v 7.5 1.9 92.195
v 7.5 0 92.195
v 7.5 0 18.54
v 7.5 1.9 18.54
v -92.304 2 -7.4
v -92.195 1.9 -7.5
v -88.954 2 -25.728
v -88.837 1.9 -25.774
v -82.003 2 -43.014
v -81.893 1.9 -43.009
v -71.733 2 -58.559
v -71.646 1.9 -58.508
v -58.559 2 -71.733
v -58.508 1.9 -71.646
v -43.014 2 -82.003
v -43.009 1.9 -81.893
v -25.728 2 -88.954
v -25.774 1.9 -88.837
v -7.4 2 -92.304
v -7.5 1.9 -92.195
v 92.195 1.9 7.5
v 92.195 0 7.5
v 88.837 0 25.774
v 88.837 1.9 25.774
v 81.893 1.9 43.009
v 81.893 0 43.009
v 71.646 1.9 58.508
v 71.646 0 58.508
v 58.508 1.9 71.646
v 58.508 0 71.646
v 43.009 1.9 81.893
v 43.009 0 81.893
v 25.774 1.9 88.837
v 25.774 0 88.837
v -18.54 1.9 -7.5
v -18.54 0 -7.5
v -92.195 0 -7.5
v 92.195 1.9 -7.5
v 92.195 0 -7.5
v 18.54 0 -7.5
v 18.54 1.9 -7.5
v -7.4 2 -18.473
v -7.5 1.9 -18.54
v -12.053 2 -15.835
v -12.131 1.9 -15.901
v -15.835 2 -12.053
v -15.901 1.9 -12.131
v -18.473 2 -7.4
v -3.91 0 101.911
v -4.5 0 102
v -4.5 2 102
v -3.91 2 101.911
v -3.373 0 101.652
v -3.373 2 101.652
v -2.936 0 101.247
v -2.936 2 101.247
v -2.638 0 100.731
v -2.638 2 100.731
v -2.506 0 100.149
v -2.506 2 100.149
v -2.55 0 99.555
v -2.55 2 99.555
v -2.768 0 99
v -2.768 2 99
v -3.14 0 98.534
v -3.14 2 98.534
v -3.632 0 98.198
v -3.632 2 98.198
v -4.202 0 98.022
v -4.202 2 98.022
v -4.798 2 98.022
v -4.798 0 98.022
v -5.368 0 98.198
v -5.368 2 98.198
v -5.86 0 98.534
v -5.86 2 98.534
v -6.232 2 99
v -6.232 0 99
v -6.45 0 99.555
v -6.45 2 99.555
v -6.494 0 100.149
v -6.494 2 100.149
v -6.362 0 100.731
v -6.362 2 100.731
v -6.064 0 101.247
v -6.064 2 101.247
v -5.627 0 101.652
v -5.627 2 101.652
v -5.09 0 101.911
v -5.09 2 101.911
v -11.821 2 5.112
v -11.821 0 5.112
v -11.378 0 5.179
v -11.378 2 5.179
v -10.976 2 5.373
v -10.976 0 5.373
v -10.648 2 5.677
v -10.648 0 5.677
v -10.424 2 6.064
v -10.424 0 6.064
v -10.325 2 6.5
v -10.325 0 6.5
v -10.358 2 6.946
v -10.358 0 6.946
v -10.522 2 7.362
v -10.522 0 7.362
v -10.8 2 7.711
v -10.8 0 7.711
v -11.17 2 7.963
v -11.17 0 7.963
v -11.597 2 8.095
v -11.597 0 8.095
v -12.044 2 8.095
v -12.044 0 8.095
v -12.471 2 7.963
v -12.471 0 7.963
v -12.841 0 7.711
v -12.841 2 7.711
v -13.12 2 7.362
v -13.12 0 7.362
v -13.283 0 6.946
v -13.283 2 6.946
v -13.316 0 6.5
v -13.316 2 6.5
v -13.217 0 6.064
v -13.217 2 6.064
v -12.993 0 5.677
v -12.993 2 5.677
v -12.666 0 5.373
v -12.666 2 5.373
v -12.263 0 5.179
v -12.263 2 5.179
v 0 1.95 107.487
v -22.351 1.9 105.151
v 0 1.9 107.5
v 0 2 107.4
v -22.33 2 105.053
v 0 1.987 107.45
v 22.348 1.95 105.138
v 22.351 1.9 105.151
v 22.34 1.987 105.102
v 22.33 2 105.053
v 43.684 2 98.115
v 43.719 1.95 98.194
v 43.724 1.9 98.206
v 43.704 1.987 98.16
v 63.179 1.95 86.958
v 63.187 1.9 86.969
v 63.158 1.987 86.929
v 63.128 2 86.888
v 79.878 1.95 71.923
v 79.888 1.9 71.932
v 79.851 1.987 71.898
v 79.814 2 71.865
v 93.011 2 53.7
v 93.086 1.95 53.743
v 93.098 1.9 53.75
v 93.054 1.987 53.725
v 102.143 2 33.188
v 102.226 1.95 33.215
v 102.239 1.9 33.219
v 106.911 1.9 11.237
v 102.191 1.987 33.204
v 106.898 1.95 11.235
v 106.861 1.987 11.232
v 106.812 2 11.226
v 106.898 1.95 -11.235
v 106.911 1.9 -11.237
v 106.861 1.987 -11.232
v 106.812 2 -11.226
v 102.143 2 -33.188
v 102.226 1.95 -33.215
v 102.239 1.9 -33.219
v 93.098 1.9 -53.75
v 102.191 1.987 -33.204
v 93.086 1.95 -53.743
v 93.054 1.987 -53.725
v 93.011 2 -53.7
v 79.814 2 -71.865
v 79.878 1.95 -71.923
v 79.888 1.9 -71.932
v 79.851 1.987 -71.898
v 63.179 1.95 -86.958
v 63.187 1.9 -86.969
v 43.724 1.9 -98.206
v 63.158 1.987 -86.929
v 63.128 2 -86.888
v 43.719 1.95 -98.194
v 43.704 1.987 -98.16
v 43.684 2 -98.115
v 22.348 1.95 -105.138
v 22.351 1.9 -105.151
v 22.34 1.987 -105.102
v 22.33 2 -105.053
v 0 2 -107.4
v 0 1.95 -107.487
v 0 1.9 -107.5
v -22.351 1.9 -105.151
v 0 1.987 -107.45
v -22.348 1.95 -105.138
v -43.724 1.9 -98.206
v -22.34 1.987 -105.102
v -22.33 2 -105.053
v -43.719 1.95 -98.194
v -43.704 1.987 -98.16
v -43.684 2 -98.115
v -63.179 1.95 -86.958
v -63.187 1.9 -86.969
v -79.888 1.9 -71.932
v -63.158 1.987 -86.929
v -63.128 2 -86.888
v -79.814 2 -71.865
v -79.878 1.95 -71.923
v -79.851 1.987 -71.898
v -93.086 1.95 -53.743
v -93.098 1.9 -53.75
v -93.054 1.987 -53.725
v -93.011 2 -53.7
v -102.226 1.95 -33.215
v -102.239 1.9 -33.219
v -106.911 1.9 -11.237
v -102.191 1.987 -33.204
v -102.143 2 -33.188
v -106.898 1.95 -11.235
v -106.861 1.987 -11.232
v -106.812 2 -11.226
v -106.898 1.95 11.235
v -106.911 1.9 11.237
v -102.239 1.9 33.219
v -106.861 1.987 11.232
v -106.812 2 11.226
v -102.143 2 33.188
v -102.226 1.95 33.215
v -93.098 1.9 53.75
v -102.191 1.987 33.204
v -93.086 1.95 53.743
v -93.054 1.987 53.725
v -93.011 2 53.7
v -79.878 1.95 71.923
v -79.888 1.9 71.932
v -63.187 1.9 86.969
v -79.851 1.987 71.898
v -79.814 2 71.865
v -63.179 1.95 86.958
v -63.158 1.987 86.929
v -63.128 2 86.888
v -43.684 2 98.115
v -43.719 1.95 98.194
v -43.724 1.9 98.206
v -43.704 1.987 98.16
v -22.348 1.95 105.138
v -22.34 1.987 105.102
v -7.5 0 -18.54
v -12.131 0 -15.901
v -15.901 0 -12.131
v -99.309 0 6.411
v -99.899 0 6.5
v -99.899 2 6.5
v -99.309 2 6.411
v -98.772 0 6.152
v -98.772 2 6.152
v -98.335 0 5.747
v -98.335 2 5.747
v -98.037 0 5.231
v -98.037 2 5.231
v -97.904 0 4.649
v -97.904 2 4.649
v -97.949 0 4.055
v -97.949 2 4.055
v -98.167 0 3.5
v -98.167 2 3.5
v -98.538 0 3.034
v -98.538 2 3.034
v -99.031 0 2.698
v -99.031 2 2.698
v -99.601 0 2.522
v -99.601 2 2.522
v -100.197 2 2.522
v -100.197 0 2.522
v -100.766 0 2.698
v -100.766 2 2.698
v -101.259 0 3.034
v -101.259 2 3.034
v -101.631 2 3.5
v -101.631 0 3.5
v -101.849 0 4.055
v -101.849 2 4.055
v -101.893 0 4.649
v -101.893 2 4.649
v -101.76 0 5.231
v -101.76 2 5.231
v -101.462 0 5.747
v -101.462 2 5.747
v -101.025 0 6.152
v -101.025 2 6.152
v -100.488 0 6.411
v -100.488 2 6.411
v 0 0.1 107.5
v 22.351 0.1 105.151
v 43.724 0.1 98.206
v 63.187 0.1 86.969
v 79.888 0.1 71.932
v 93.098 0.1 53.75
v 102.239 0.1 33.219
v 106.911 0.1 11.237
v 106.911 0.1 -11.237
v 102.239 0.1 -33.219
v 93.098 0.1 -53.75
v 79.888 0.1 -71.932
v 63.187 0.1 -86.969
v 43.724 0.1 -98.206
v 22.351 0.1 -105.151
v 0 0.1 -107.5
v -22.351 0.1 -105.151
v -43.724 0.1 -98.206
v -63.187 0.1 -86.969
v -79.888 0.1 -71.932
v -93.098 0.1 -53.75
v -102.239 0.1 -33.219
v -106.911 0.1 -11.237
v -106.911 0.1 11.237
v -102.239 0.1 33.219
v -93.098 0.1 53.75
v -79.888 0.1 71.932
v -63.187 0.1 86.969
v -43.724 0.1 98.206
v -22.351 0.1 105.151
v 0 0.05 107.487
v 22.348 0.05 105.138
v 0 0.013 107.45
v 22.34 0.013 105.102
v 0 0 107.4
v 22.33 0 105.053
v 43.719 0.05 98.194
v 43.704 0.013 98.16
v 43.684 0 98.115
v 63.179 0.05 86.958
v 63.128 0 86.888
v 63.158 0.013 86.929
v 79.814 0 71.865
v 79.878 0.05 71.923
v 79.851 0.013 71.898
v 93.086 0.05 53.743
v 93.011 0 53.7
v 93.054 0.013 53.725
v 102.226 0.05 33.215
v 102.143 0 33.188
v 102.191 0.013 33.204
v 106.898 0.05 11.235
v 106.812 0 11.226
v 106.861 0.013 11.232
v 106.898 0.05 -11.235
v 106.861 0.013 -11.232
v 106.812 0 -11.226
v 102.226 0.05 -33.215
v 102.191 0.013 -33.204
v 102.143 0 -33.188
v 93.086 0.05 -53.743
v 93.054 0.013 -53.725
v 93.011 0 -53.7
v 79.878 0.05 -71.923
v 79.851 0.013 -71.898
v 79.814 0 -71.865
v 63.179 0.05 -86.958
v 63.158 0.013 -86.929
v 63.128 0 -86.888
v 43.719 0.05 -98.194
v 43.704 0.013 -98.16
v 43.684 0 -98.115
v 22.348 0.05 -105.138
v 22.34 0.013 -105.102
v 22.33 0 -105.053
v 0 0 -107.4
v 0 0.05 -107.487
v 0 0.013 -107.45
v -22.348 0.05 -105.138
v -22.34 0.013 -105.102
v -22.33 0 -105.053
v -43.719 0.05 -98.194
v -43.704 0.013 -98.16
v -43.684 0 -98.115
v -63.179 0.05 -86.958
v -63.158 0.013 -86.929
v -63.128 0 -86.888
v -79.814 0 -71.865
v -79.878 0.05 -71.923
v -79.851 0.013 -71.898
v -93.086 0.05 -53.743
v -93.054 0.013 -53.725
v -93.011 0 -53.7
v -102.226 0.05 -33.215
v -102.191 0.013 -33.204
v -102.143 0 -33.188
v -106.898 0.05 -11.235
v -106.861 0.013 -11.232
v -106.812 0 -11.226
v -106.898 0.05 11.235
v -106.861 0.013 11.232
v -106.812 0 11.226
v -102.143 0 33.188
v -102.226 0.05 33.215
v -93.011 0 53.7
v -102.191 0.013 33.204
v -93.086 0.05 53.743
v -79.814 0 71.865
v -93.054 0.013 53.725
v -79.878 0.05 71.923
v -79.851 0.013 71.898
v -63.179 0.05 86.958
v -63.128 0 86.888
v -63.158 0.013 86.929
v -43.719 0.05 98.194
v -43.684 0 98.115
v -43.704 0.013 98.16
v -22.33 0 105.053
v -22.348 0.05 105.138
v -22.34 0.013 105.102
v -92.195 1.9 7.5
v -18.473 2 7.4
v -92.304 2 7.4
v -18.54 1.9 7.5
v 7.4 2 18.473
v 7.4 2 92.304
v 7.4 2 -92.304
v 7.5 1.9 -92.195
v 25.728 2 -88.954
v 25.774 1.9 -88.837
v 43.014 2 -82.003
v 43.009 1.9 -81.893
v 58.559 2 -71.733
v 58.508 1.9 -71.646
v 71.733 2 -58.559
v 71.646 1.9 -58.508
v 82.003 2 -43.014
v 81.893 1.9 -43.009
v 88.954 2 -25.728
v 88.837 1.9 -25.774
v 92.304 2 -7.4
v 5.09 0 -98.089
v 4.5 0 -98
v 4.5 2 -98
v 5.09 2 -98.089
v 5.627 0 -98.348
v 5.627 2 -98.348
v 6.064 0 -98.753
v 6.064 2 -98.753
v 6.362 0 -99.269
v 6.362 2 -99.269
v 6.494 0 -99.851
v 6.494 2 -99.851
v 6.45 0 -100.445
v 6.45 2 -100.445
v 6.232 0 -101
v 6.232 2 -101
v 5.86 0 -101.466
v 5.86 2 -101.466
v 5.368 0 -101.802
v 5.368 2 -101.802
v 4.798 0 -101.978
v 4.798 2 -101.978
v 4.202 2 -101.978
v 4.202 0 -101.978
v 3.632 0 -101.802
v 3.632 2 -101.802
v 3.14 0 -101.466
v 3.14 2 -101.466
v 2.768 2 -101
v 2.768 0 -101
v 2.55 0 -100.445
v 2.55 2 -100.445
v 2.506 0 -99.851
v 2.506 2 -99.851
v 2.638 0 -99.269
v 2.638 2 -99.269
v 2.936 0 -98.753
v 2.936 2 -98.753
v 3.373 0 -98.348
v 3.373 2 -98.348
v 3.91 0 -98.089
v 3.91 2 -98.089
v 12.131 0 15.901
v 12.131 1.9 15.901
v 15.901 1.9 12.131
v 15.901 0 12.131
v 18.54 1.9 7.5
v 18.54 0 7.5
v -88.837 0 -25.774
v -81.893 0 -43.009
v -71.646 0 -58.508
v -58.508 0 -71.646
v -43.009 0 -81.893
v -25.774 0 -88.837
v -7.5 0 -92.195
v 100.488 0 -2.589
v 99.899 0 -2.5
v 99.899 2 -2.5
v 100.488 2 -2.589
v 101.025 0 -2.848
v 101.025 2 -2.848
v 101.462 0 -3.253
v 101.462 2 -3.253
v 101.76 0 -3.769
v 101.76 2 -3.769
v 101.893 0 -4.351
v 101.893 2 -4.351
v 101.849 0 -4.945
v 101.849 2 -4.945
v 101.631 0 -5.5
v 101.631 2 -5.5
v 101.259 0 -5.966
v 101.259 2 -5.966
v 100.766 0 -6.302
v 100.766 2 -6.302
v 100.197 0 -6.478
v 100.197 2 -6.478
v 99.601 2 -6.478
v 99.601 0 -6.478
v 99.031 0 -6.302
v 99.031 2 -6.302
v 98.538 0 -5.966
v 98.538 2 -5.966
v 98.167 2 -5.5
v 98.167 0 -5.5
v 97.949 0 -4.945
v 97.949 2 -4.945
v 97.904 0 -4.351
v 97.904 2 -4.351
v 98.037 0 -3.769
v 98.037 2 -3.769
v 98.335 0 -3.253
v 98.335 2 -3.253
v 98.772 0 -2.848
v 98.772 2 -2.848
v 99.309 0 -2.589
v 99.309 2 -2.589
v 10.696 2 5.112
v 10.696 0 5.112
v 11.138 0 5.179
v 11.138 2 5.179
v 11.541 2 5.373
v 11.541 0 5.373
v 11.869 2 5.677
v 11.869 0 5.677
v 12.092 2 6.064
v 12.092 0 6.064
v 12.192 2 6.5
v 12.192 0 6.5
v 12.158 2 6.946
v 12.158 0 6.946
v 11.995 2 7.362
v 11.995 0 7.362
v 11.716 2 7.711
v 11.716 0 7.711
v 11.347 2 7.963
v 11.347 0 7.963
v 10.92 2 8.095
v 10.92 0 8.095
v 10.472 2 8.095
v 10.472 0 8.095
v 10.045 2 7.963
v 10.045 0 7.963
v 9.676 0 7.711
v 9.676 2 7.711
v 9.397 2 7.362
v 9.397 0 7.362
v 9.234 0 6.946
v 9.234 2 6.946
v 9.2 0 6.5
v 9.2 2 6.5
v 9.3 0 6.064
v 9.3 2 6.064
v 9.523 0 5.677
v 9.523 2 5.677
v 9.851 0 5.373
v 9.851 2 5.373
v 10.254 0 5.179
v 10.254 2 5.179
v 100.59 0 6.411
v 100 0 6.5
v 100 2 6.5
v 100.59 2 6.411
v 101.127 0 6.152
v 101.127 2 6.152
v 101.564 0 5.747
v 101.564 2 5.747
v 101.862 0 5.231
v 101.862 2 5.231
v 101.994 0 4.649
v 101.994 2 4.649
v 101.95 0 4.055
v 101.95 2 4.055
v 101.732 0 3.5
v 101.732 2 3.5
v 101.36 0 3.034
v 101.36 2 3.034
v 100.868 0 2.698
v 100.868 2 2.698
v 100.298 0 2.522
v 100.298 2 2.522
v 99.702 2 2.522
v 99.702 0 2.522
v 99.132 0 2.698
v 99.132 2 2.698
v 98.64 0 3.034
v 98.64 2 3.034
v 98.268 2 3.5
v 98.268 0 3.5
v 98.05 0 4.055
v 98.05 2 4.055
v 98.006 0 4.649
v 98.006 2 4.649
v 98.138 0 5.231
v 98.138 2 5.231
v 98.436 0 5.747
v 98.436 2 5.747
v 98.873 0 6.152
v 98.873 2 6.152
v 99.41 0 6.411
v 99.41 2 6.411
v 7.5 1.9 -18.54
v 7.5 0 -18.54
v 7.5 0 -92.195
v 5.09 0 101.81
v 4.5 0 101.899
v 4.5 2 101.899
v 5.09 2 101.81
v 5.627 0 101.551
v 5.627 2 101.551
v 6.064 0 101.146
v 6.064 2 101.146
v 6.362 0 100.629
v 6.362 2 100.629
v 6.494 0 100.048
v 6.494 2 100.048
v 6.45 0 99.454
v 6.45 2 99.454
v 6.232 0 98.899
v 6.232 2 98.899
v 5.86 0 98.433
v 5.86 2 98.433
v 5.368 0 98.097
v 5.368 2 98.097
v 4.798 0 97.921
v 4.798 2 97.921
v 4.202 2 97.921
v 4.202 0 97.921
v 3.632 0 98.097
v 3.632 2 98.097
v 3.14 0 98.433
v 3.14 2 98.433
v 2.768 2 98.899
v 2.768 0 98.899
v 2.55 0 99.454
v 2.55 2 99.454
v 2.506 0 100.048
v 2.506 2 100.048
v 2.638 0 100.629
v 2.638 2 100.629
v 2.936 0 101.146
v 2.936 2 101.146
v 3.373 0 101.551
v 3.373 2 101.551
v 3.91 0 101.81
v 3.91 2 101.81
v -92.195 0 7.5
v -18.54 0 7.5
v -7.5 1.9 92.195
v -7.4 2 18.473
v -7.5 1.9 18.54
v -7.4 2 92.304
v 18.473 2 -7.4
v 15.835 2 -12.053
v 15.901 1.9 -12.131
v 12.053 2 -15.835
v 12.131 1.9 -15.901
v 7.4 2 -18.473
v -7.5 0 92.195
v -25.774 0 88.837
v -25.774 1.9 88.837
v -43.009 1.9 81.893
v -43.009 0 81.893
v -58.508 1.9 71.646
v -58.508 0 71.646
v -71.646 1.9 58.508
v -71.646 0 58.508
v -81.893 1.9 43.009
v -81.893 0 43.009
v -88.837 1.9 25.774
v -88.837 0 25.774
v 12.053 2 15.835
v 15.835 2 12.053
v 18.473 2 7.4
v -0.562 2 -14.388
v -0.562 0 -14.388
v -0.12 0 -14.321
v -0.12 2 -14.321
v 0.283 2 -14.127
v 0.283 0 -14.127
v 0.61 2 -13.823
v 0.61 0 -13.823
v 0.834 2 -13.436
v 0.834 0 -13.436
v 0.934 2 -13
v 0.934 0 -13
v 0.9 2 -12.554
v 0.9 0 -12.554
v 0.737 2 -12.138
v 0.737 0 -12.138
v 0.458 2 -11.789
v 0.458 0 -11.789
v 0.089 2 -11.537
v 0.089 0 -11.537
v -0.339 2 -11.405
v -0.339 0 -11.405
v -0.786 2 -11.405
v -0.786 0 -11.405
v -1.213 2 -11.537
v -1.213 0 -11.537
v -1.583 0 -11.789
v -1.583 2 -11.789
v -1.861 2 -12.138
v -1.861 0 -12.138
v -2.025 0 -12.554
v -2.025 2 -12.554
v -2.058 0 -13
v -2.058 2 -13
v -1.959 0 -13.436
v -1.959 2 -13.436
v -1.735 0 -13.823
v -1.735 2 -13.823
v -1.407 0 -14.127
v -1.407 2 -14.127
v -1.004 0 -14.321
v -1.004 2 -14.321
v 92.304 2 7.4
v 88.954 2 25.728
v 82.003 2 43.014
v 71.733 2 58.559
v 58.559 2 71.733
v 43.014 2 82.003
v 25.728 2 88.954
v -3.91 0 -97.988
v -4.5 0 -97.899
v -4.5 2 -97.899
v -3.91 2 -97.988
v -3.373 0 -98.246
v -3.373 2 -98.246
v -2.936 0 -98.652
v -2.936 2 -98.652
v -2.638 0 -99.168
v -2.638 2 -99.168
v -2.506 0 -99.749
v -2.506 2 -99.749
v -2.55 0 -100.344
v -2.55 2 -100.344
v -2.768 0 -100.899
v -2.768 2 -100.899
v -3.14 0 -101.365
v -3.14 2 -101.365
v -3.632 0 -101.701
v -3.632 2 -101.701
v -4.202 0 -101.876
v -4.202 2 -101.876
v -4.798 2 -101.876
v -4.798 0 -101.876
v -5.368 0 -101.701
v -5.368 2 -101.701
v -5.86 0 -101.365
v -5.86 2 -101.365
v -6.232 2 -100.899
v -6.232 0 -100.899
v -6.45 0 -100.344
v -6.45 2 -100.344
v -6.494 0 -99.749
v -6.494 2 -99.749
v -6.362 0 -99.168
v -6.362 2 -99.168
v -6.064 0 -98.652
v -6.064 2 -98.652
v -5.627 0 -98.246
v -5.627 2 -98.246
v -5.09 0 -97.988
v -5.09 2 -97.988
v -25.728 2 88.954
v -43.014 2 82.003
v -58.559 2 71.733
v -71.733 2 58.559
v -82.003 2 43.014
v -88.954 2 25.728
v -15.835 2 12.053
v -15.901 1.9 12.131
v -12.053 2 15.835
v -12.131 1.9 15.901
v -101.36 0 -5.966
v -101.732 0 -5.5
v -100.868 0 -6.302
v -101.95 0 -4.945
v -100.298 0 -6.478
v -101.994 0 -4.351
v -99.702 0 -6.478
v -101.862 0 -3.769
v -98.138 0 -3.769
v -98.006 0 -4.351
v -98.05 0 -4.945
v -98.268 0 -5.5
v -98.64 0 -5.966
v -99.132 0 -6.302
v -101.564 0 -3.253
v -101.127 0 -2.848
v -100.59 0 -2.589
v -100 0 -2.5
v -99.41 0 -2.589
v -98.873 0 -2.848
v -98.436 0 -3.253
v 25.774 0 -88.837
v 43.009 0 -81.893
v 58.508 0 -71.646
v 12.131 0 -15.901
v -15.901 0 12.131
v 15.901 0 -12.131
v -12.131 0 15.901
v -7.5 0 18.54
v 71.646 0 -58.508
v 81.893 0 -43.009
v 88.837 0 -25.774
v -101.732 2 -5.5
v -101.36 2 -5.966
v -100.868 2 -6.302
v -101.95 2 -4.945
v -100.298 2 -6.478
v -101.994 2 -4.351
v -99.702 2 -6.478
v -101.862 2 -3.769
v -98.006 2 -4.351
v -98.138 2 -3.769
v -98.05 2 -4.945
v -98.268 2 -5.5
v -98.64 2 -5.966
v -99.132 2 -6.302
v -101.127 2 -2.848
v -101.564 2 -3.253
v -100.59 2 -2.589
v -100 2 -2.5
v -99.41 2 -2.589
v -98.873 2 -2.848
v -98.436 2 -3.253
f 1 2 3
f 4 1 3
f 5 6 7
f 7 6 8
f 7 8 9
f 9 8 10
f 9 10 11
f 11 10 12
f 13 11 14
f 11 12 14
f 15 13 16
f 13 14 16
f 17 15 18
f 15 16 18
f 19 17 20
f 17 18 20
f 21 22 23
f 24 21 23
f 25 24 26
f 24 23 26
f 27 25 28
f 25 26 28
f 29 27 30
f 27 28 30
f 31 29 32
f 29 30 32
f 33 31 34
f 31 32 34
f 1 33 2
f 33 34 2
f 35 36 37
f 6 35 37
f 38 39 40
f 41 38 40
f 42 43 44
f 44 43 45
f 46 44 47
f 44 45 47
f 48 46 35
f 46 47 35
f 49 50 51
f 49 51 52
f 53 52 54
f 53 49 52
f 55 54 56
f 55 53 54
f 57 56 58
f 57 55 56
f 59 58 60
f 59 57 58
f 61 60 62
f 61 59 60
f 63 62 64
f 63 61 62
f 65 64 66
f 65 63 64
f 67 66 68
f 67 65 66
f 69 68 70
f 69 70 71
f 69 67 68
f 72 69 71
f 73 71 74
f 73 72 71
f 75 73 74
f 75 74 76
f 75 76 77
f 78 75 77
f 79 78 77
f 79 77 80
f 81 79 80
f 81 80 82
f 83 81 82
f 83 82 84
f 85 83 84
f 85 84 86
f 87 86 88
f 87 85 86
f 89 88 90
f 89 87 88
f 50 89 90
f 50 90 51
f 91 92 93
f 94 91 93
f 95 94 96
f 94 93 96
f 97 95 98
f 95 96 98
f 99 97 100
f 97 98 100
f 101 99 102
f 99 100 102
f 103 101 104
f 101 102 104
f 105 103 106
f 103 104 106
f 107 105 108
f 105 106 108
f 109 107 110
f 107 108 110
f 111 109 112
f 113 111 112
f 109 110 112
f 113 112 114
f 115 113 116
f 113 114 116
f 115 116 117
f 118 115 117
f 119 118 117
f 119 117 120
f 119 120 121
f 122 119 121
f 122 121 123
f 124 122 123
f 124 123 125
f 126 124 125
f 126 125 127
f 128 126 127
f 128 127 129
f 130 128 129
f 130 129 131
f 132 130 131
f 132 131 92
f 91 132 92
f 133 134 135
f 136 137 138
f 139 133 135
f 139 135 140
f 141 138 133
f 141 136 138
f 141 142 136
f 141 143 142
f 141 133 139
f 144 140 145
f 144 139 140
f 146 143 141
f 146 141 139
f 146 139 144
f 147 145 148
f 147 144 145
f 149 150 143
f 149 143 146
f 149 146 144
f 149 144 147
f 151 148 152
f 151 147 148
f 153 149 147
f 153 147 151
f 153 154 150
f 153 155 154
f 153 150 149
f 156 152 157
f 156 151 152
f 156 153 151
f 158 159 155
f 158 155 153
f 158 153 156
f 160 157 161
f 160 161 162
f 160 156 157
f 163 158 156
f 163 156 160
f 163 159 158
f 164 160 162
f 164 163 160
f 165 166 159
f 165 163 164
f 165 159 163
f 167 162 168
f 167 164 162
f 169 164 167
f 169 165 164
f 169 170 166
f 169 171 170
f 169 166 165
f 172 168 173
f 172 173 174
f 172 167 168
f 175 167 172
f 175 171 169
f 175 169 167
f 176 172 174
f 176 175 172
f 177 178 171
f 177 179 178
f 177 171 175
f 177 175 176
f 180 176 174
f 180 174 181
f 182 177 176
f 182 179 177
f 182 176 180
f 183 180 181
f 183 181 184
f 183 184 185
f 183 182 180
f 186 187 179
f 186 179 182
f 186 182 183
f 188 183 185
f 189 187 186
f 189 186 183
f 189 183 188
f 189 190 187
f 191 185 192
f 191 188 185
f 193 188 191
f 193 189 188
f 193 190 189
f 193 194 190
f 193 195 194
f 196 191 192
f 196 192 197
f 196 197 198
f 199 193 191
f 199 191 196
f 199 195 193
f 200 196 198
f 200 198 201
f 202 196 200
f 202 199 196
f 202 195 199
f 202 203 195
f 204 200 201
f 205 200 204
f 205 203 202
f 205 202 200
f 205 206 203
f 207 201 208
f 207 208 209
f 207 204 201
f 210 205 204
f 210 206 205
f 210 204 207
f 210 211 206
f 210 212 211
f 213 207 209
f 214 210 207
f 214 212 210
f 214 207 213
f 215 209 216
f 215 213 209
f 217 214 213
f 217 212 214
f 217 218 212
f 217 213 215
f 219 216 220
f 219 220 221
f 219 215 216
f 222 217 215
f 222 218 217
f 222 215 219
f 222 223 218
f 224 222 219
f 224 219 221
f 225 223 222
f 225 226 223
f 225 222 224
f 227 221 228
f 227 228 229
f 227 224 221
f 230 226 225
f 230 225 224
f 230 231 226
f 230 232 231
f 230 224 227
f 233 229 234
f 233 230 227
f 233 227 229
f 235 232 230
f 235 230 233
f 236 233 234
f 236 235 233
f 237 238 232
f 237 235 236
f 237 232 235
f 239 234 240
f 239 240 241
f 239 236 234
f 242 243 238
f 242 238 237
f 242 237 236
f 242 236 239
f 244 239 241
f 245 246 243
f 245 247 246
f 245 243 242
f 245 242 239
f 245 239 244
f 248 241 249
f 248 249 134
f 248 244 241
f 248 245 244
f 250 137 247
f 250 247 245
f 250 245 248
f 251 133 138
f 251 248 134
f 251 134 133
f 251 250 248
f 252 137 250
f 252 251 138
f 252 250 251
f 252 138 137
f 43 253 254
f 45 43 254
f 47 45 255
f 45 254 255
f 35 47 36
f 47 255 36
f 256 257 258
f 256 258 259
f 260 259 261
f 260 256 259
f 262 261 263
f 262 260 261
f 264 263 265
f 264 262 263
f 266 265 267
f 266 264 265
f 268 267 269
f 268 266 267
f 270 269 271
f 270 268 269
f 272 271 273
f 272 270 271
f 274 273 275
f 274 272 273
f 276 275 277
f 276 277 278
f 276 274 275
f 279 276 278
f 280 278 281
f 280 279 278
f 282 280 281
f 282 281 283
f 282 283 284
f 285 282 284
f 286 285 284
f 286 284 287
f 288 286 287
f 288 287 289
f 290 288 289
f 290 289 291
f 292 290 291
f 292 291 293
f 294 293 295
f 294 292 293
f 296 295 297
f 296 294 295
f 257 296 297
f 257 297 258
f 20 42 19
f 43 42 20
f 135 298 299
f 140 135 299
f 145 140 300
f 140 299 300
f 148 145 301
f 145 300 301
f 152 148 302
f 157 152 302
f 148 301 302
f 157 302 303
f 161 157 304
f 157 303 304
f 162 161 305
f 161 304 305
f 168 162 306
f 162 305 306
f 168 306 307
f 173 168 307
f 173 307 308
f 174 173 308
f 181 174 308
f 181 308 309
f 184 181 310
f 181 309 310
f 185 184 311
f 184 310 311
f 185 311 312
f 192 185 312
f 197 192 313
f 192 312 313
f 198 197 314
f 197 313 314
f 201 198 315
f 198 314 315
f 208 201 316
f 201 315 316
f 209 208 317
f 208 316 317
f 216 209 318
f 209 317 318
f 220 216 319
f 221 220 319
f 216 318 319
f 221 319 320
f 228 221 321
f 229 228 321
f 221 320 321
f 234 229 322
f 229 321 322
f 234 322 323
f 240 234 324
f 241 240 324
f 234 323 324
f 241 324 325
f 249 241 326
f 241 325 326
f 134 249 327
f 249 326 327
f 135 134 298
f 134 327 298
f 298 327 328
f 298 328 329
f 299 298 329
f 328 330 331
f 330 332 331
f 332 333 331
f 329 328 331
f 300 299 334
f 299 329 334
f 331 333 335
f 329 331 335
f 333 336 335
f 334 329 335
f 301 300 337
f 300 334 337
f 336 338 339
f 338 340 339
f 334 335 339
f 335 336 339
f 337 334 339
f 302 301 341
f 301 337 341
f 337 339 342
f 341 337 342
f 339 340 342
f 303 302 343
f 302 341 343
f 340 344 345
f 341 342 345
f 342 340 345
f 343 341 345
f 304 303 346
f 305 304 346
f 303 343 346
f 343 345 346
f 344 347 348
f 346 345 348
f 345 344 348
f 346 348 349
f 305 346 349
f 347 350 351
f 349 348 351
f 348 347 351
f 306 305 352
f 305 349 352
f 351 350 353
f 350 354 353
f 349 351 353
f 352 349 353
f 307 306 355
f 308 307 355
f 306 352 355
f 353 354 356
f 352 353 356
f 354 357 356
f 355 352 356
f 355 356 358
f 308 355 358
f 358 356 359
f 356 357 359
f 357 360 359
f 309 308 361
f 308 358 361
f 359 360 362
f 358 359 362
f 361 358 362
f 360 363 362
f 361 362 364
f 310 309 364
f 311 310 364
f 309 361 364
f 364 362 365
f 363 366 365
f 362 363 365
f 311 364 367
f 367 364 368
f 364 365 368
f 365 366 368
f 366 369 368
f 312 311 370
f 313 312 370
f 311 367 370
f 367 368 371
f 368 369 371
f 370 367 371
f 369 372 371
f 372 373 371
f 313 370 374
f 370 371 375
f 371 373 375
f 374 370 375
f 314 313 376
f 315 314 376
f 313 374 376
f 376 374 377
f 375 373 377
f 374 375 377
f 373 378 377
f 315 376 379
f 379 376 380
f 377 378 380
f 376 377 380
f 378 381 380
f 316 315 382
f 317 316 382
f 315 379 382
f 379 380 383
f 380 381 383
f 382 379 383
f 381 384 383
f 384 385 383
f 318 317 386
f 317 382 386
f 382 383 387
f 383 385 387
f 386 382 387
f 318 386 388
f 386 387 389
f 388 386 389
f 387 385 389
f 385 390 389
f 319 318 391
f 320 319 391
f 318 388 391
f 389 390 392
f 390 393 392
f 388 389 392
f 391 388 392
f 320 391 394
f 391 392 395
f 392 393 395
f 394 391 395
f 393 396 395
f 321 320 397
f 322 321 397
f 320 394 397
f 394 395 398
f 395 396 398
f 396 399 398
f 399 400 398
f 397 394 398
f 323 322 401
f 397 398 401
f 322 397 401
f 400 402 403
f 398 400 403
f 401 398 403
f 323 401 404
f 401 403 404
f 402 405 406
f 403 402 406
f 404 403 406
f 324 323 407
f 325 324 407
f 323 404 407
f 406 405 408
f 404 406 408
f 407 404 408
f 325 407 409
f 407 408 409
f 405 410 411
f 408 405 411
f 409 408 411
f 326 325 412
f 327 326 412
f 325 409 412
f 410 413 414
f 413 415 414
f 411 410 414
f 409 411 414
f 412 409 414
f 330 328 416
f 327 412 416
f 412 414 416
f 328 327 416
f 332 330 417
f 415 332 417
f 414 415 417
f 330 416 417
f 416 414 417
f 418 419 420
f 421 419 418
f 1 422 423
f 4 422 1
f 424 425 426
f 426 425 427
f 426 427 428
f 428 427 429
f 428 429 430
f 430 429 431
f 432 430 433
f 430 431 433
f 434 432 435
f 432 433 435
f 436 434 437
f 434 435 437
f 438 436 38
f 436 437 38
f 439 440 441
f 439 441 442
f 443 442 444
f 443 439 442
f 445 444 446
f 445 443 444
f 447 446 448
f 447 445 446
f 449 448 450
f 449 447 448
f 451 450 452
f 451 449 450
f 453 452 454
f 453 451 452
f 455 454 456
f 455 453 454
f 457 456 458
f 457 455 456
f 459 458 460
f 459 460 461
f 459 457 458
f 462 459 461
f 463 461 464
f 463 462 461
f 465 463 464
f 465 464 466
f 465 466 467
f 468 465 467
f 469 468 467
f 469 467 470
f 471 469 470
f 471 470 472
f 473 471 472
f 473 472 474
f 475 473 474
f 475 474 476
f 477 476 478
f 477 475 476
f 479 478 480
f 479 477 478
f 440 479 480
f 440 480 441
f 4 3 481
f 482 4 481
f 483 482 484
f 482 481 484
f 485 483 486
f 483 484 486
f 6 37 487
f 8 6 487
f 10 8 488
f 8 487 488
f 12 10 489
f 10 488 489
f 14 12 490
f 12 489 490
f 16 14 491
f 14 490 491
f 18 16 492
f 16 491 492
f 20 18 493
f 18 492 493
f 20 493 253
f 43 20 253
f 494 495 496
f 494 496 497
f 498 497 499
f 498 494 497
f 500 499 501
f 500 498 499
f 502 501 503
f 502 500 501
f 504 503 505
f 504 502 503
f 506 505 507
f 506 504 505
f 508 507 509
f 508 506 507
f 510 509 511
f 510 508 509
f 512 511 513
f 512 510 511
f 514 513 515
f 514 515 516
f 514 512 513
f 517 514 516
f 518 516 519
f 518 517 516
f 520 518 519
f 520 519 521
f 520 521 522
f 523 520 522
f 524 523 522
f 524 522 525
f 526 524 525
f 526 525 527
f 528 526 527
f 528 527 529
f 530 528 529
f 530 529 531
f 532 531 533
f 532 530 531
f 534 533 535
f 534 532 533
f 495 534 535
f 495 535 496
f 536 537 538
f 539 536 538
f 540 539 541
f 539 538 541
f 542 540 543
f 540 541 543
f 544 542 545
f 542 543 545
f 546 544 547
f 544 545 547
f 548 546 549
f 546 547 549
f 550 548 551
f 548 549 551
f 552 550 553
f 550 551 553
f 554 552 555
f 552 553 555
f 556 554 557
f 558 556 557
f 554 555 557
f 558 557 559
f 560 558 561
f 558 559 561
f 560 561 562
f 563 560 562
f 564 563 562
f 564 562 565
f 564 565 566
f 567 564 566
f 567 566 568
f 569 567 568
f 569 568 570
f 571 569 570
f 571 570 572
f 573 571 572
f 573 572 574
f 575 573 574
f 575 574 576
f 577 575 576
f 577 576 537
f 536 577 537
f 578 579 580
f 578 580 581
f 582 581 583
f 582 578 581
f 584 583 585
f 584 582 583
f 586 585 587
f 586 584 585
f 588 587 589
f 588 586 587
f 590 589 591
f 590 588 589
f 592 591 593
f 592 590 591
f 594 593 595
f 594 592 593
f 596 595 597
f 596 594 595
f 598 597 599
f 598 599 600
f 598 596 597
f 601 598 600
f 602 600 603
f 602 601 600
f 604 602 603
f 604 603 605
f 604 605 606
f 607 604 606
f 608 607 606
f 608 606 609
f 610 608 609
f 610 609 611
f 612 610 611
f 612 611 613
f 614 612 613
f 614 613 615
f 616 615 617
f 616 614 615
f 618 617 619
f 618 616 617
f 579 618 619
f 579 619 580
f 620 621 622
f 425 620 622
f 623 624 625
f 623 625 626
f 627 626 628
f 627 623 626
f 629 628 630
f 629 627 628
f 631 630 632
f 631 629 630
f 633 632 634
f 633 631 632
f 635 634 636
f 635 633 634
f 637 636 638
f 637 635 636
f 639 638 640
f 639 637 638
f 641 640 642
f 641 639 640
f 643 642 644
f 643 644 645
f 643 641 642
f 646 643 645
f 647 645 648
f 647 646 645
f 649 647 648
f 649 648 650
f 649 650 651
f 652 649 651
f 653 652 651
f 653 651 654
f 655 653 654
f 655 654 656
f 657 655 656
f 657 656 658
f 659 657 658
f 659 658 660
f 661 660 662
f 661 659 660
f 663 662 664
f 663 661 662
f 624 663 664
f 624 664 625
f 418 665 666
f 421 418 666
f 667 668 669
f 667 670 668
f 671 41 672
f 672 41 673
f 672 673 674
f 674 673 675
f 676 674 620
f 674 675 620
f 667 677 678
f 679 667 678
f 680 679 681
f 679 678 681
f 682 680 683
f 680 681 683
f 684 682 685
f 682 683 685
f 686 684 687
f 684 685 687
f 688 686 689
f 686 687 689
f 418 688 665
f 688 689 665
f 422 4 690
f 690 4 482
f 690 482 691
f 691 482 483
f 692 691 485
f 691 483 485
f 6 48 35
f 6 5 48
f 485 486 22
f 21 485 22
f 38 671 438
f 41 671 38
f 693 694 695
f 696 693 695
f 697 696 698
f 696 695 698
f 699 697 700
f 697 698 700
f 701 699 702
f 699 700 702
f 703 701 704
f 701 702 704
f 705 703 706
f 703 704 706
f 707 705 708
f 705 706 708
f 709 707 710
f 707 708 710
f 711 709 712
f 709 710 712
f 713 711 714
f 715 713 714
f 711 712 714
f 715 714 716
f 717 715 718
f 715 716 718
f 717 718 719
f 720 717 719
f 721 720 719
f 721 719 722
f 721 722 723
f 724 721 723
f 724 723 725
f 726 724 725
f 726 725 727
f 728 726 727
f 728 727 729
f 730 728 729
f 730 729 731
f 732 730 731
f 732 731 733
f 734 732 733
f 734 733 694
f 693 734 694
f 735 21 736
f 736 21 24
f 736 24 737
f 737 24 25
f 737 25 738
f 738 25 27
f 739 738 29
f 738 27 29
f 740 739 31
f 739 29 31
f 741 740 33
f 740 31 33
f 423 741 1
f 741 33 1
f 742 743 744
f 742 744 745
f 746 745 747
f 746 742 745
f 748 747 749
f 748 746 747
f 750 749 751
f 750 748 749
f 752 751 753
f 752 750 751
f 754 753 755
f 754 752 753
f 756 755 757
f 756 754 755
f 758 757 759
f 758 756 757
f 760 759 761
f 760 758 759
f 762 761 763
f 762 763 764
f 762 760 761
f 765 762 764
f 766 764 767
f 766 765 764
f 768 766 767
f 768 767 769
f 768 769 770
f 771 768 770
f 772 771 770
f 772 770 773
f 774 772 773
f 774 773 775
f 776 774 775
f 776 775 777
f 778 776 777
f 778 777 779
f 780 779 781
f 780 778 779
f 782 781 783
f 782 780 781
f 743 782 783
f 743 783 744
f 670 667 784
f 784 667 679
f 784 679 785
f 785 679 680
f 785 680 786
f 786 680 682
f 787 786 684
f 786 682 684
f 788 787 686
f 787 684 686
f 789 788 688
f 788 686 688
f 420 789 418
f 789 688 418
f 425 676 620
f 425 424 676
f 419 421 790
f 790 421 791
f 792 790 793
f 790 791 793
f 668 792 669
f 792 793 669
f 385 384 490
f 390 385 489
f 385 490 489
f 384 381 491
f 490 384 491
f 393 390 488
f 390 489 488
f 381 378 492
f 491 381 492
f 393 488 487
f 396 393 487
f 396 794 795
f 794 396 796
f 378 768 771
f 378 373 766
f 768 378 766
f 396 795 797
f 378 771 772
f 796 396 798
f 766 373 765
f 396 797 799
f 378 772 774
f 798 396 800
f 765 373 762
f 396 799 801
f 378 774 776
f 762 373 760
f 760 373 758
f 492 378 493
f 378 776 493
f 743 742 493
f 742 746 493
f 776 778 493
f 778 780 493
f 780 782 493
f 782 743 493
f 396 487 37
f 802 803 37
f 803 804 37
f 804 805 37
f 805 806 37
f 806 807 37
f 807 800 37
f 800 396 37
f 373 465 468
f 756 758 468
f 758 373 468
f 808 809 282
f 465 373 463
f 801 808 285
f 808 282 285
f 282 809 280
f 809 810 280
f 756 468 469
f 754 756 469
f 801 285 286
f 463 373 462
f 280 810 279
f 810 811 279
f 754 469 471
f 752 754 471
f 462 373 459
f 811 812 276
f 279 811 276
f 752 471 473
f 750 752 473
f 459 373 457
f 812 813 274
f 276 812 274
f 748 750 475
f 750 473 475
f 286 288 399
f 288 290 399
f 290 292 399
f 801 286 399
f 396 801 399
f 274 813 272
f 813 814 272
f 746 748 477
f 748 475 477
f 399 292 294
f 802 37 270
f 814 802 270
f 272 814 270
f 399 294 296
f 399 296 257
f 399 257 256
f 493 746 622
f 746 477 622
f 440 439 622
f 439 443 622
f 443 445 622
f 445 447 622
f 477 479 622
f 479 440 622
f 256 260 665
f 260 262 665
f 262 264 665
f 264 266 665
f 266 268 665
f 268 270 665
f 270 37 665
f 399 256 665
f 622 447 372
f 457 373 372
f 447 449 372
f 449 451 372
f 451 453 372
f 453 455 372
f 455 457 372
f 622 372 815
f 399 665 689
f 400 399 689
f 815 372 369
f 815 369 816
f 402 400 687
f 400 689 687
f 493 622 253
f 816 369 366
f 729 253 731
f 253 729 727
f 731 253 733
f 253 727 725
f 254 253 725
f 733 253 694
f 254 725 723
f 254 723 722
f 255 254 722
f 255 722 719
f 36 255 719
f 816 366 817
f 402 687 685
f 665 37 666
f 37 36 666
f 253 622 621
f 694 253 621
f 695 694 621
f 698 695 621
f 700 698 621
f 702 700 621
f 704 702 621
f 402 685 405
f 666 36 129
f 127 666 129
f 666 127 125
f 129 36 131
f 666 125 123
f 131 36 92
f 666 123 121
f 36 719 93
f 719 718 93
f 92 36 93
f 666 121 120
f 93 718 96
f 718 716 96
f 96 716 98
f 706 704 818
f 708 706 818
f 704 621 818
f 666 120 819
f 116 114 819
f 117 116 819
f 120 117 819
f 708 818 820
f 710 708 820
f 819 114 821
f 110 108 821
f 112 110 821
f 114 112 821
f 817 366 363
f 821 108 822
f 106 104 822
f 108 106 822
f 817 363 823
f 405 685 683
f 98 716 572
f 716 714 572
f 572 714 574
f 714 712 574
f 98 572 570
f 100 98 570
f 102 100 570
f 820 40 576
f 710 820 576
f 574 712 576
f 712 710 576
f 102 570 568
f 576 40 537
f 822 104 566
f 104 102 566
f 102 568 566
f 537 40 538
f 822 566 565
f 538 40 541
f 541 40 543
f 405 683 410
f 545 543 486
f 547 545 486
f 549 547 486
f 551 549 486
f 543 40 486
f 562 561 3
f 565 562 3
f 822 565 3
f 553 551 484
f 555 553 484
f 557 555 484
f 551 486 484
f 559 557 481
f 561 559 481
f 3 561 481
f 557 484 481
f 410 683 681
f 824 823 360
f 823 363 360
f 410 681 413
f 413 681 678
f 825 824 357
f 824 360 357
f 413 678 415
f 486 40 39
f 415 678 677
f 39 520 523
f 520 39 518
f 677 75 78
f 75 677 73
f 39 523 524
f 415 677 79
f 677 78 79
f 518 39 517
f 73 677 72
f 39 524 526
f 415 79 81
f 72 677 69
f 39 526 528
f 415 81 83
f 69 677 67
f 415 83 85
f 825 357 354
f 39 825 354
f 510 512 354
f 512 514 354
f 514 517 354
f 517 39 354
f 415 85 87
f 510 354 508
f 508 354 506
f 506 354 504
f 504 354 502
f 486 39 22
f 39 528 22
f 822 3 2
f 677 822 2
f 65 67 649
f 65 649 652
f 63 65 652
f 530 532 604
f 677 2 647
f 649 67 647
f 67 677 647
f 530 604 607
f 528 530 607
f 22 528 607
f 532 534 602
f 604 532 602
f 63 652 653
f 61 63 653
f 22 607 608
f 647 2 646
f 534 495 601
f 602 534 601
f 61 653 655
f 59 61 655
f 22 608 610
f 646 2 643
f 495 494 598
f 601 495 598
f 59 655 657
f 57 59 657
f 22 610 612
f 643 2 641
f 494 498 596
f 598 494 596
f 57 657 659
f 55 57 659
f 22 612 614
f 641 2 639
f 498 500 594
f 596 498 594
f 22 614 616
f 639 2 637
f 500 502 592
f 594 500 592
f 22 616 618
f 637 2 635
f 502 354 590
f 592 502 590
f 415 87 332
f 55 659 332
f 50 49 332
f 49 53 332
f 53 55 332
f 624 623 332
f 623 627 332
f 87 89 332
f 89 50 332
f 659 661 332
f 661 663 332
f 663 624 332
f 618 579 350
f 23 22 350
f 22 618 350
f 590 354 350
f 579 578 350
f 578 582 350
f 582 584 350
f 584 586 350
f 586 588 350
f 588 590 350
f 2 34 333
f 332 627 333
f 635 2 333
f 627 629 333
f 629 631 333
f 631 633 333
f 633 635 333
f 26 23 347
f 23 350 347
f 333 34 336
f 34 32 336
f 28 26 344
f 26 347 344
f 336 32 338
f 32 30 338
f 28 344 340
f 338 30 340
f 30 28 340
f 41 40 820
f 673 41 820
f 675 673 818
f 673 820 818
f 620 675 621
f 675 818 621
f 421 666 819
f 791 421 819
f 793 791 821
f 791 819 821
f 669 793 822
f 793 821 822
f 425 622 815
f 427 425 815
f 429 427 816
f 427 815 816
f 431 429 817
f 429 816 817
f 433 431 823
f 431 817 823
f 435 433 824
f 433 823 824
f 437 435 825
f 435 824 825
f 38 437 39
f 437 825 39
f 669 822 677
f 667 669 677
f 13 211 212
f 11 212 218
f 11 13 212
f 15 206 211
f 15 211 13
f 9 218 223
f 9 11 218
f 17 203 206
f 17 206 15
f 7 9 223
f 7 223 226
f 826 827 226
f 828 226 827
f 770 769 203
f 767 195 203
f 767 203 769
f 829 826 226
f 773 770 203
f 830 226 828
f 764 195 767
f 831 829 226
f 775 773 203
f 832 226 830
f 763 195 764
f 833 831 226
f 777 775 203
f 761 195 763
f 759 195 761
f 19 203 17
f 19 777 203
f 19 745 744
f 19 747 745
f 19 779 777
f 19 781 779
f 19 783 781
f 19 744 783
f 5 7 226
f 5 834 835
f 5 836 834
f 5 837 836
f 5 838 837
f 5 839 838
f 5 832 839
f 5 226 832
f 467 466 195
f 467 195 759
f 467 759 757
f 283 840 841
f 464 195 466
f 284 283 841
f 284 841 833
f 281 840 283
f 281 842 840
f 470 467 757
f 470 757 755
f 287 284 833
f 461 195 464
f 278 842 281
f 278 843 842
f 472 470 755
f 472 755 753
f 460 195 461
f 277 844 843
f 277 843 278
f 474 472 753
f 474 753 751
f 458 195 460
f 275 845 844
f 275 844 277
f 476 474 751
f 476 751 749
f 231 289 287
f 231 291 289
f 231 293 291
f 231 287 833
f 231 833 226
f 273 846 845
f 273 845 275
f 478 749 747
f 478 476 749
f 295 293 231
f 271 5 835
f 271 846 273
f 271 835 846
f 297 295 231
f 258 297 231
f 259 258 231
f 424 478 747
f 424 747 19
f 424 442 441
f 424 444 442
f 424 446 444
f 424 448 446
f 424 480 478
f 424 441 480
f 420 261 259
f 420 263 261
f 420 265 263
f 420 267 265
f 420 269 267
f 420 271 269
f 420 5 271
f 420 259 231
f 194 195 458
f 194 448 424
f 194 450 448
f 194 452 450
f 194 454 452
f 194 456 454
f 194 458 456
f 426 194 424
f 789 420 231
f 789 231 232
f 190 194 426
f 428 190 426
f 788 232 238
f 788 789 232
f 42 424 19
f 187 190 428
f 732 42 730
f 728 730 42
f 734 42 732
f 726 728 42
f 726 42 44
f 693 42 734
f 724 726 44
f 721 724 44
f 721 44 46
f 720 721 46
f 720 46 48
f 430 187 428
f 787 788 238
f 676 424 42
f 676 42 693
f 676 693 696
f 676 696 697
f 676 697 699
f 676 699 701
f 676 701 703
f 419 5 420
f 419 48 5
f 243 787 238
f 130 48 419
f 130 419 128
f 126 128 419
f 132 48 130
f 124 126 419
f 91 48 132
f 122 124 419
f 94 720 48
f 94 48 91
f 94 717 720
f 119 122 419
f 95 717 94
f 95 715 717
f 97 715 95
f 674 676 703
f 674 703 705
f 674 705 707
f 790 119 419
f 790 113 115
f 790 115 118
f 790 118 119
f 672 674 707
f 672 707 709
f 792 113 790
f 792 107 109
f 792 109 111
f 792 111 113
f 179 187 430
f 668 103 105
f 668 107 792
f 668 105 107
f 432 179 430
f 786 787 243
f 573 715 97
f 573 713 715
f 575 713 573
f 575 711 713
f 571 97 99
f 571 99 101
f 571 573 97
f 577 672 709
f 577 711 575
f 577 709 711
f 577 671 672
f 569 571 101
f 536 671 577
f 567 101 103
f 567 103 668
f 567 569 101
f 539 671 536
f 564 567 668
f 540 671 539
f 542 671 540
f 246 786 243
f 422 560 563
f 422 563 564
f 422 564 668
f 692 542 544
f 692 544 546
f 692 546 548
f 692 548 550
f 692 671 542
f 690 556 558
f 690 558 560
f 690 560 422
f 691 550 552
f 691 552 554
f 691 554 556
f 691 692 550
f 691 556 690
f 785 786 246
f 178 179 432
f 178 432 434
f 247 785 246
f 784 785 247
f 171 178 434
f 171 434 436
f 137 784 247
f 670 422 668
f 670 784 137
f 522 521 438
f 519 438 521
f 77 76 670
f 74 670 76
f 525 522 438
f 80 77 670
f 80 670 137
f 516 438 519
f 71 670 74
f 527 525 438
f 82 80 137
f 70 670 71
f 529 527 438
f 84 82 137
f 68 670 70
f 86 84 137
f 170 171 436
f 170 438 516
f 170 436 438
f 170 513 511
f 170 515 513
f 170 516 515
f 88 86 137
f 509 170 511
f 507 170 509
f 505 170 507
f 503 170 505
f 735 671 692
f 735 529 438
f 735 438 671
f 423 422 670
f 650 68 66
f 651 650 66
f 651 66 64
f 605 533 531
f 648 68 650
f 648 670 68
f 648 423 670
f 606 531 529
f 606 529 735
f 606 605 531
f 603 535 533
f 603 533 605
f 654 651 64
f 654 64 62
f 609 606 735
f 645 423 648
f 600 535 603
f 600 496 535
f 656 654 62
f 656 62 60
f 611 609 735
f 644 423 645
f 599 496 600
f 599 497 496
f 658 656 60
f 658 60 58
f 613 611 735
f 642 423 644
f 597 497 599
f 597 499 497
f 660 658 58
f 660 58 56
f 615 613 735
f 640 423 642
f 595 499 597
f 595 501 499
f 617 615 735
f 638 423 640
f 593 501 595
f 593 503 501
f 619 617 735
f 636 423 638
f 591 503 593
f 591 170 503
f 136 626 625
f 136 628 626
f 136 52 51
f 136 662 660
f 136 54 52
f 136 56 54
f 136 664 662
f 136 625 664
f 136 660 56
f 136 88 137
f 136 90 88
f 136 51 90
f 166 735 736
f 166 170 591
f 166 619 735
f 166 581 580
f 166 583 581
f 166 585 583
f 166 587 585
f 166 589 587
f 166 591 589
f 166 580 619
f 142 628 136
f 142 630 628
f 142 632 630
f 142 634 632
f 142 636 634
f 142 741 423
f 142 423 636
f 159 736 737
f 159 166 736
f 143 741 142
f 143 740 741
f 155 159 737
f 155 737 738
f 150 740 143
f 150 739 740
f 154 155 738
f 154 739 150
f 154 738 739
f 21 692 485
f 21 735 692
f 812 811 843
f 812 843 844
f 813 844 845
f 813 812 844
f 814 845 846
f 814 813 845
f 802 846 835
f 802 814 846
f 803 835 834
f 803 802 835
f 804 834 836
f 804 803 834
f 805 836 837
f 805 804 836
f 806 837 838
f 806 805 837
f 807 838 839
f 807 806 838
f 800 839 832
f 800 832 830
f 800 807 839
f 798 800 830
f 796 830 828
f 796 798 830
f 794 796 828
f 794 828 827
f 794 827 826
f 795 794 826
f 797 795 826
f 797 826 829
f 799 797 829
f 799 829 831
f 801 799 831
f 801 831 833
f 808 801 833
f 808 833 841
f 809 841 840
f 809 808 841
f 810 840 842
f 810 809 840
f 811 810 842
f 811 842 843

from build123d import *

# Parameters (mm, degrees)
SKETCH1_R           = 107.5
SKETCH1_R_2         = 2
BOSS_EXTRUDE1_DEPTH = 2
SKETCH2_R           = 1.5
CUT_EXTRUDE1_DEPTH  = 153.041112861
FILLET1_R           = 0.1


with BuildPart() as part:
    # Sketch1 → Boss-Extrude1 (new body)
    with BuildSketch(Plane(origin=(0, 0, 0), x_dir=(1, 0, 0), z_dir=(0, 1, 0))):
        with Locations(Location((0, 0, 0), (0, 0, 270))):
            Circle(SKETCH1_R)
        with Locations(Location((-4.5, -100, 0), (0, 0, 270))):
            Circle(SKETCH1_R_2, mode=Mode.SUBTRACT)
        with Locations(Location((-99.89869869, -4.5, 0), (0, 0, 270))):
            Circle(SKETCH1_R_2, mode=Mode.SUBTRACT)
        with BuildLine():
            ThreePointArc((-7.5, -92.195444573), (-65.40737726, -65.40737726), (-92.195444573, -7.5))
            Line((-92.195444573, -7.5), (-18.540496218, -7.5))
            ThreePointArc((-18.540496218, -7.5), (-14.142135624, -14.142135624), (-7.5, -18.540496218))
            Line((-7.5, -18.540496218), (-7.5, -92.195444573))
        make_face(mode=Mode.SUBTRACT)
        with Locations(Location((4.5, -99.89869869, 0), (0, 0, 270))):
            Circle(SKETCH1_R_2, mode=Mode.SUBTRACT)
        with BuildLine():
            Line((7.5, -92.195444573), (7.5, -18.540496218))
            ThreePointArc((7.5, -18.540496218), (14.142135624, -14.142135624), (18.540496218, -7.5))
            Line((18.540496218, -7.5), (92.195444573, -7.5))
            ThreePointArc((92.195444573, -7.5), (65.40737726, -65.40737726), (7.5, -92.195444573))
        make_face(mode=Mode.SUBTRACT)
        with Locations(Location((100, -4.5, 0), (0, 0, 270))):
            Circle(SKETCH1_R_2, mode=Mode.SUBTRACT)
        with Locations(Location((-100, 4.5, 0), (0, 0, 270))):
            Circle(SKETCH1_R_2, mode=Mode.SUBTRACT)
        with BuildLine():
            ThreePointArc((-92.195444573, 7.5), (-65.40737726, 65.40737726), (-7.5, 92.195444573))
            Line((-7.5, 92.195444573), (-7.5, 18.540496218))
            ThreePointArc((-7.5, 18.540496218), (-14.142135624, 14.142135624), (-18.540496218, 7.5))
            Line((-18.540496218, 7.5), (-92.195444573, 7.5))
        make_face(mode=Mode.SUBTRACT)
        with Locations(Location((-4.5, 99.89869869, 0), (0, 0, 270))):
            Circle(SKETCH1_R_2, mode=Mode.SUBTRACT)
        with BuildLine():
            Line((7.5, 18.540496218), (7.5, 92.195444573))
            ThreePointArc((7.5, 92.195444573), (65.40737726, 65.40737726), (92.195444573, 7.5))
            Line((92.195444573, 7.5), (18.540496218, 7.5))
            ThreePointArc((18.540496218, 7.5), (14.142135624, 14.142135624), (7.5, 18.540496218))
        make_face(mode=Mode.SUBTRACT)
        with Locations(Location((99.89869869, 4.5, 0), (0, 0, 270))):
            Circle(SKETCH1_R_2, mode=Mode.SUBTRACT)
        with Locations(Location((4.5, 100, 0), (0, 0, 270))):
            Circle(SKETCH1_R_2, mode=Mode.SUBTRACT)
    extrude(amount=BOSS_EXTRUDE1_DEPTH)

    # Sketch2 → Cut-Extrude1 (cut, through all)
    with BuildSketch(Plane.XZ):
        with Locations(Location((-11.820616269, 6.611877399, 0), (0, 0, 270))):
            Circle(SKETCH2_R)
        with Locations(Location((-0.56228602, -12.888122601, 0), (0, 0, 270))):
            Circle(SKETCH2_R)
        with Locations(Location((10.696044229, 6.611877399, 0), (0, 0, 270))):
            Circle(SKETCH2_R)
    extrude(amount=-CUT_EXTRUDE1_DEPTH, mode=Mode.SUBTRACT)

    # Fillet1
    fillet1_edges = [part.edges().sort_by_distance(p)[0] for p in [
        (7.5, 2, 55.367970395),
        (14.142135624, 2, 14.142135624),
        (55.367970395, 2, 7.5),
        (0, 2, -107.5),
        (-65.40737726, 2, -65.40737726),
        (-7.5, 2, -55.367970395),
        (-14.142135624, 2, -14.142135624),
        (0, 0, -107.5),
        (-55.367970395, 2, -7.5),
        (7.5, 2, -55.367970395),
        (65.40737726, 2, -65.40737726),
        (55.367970395, 2, -7.5),
        (14.142135624, 2, -14.142135624),
        (-65.40737726, 2, 65.40737726),
        (-55.367970395, 2, 7.5),
        (-14.142135624, 2, 14.142135624),
        (-7.5, 2, 55.367970395),
        (65.40737726, 2, 65.40737726),
    ]]
    fillet(fillet1_edges, radius=FILLET1_R)


solid = part.part
